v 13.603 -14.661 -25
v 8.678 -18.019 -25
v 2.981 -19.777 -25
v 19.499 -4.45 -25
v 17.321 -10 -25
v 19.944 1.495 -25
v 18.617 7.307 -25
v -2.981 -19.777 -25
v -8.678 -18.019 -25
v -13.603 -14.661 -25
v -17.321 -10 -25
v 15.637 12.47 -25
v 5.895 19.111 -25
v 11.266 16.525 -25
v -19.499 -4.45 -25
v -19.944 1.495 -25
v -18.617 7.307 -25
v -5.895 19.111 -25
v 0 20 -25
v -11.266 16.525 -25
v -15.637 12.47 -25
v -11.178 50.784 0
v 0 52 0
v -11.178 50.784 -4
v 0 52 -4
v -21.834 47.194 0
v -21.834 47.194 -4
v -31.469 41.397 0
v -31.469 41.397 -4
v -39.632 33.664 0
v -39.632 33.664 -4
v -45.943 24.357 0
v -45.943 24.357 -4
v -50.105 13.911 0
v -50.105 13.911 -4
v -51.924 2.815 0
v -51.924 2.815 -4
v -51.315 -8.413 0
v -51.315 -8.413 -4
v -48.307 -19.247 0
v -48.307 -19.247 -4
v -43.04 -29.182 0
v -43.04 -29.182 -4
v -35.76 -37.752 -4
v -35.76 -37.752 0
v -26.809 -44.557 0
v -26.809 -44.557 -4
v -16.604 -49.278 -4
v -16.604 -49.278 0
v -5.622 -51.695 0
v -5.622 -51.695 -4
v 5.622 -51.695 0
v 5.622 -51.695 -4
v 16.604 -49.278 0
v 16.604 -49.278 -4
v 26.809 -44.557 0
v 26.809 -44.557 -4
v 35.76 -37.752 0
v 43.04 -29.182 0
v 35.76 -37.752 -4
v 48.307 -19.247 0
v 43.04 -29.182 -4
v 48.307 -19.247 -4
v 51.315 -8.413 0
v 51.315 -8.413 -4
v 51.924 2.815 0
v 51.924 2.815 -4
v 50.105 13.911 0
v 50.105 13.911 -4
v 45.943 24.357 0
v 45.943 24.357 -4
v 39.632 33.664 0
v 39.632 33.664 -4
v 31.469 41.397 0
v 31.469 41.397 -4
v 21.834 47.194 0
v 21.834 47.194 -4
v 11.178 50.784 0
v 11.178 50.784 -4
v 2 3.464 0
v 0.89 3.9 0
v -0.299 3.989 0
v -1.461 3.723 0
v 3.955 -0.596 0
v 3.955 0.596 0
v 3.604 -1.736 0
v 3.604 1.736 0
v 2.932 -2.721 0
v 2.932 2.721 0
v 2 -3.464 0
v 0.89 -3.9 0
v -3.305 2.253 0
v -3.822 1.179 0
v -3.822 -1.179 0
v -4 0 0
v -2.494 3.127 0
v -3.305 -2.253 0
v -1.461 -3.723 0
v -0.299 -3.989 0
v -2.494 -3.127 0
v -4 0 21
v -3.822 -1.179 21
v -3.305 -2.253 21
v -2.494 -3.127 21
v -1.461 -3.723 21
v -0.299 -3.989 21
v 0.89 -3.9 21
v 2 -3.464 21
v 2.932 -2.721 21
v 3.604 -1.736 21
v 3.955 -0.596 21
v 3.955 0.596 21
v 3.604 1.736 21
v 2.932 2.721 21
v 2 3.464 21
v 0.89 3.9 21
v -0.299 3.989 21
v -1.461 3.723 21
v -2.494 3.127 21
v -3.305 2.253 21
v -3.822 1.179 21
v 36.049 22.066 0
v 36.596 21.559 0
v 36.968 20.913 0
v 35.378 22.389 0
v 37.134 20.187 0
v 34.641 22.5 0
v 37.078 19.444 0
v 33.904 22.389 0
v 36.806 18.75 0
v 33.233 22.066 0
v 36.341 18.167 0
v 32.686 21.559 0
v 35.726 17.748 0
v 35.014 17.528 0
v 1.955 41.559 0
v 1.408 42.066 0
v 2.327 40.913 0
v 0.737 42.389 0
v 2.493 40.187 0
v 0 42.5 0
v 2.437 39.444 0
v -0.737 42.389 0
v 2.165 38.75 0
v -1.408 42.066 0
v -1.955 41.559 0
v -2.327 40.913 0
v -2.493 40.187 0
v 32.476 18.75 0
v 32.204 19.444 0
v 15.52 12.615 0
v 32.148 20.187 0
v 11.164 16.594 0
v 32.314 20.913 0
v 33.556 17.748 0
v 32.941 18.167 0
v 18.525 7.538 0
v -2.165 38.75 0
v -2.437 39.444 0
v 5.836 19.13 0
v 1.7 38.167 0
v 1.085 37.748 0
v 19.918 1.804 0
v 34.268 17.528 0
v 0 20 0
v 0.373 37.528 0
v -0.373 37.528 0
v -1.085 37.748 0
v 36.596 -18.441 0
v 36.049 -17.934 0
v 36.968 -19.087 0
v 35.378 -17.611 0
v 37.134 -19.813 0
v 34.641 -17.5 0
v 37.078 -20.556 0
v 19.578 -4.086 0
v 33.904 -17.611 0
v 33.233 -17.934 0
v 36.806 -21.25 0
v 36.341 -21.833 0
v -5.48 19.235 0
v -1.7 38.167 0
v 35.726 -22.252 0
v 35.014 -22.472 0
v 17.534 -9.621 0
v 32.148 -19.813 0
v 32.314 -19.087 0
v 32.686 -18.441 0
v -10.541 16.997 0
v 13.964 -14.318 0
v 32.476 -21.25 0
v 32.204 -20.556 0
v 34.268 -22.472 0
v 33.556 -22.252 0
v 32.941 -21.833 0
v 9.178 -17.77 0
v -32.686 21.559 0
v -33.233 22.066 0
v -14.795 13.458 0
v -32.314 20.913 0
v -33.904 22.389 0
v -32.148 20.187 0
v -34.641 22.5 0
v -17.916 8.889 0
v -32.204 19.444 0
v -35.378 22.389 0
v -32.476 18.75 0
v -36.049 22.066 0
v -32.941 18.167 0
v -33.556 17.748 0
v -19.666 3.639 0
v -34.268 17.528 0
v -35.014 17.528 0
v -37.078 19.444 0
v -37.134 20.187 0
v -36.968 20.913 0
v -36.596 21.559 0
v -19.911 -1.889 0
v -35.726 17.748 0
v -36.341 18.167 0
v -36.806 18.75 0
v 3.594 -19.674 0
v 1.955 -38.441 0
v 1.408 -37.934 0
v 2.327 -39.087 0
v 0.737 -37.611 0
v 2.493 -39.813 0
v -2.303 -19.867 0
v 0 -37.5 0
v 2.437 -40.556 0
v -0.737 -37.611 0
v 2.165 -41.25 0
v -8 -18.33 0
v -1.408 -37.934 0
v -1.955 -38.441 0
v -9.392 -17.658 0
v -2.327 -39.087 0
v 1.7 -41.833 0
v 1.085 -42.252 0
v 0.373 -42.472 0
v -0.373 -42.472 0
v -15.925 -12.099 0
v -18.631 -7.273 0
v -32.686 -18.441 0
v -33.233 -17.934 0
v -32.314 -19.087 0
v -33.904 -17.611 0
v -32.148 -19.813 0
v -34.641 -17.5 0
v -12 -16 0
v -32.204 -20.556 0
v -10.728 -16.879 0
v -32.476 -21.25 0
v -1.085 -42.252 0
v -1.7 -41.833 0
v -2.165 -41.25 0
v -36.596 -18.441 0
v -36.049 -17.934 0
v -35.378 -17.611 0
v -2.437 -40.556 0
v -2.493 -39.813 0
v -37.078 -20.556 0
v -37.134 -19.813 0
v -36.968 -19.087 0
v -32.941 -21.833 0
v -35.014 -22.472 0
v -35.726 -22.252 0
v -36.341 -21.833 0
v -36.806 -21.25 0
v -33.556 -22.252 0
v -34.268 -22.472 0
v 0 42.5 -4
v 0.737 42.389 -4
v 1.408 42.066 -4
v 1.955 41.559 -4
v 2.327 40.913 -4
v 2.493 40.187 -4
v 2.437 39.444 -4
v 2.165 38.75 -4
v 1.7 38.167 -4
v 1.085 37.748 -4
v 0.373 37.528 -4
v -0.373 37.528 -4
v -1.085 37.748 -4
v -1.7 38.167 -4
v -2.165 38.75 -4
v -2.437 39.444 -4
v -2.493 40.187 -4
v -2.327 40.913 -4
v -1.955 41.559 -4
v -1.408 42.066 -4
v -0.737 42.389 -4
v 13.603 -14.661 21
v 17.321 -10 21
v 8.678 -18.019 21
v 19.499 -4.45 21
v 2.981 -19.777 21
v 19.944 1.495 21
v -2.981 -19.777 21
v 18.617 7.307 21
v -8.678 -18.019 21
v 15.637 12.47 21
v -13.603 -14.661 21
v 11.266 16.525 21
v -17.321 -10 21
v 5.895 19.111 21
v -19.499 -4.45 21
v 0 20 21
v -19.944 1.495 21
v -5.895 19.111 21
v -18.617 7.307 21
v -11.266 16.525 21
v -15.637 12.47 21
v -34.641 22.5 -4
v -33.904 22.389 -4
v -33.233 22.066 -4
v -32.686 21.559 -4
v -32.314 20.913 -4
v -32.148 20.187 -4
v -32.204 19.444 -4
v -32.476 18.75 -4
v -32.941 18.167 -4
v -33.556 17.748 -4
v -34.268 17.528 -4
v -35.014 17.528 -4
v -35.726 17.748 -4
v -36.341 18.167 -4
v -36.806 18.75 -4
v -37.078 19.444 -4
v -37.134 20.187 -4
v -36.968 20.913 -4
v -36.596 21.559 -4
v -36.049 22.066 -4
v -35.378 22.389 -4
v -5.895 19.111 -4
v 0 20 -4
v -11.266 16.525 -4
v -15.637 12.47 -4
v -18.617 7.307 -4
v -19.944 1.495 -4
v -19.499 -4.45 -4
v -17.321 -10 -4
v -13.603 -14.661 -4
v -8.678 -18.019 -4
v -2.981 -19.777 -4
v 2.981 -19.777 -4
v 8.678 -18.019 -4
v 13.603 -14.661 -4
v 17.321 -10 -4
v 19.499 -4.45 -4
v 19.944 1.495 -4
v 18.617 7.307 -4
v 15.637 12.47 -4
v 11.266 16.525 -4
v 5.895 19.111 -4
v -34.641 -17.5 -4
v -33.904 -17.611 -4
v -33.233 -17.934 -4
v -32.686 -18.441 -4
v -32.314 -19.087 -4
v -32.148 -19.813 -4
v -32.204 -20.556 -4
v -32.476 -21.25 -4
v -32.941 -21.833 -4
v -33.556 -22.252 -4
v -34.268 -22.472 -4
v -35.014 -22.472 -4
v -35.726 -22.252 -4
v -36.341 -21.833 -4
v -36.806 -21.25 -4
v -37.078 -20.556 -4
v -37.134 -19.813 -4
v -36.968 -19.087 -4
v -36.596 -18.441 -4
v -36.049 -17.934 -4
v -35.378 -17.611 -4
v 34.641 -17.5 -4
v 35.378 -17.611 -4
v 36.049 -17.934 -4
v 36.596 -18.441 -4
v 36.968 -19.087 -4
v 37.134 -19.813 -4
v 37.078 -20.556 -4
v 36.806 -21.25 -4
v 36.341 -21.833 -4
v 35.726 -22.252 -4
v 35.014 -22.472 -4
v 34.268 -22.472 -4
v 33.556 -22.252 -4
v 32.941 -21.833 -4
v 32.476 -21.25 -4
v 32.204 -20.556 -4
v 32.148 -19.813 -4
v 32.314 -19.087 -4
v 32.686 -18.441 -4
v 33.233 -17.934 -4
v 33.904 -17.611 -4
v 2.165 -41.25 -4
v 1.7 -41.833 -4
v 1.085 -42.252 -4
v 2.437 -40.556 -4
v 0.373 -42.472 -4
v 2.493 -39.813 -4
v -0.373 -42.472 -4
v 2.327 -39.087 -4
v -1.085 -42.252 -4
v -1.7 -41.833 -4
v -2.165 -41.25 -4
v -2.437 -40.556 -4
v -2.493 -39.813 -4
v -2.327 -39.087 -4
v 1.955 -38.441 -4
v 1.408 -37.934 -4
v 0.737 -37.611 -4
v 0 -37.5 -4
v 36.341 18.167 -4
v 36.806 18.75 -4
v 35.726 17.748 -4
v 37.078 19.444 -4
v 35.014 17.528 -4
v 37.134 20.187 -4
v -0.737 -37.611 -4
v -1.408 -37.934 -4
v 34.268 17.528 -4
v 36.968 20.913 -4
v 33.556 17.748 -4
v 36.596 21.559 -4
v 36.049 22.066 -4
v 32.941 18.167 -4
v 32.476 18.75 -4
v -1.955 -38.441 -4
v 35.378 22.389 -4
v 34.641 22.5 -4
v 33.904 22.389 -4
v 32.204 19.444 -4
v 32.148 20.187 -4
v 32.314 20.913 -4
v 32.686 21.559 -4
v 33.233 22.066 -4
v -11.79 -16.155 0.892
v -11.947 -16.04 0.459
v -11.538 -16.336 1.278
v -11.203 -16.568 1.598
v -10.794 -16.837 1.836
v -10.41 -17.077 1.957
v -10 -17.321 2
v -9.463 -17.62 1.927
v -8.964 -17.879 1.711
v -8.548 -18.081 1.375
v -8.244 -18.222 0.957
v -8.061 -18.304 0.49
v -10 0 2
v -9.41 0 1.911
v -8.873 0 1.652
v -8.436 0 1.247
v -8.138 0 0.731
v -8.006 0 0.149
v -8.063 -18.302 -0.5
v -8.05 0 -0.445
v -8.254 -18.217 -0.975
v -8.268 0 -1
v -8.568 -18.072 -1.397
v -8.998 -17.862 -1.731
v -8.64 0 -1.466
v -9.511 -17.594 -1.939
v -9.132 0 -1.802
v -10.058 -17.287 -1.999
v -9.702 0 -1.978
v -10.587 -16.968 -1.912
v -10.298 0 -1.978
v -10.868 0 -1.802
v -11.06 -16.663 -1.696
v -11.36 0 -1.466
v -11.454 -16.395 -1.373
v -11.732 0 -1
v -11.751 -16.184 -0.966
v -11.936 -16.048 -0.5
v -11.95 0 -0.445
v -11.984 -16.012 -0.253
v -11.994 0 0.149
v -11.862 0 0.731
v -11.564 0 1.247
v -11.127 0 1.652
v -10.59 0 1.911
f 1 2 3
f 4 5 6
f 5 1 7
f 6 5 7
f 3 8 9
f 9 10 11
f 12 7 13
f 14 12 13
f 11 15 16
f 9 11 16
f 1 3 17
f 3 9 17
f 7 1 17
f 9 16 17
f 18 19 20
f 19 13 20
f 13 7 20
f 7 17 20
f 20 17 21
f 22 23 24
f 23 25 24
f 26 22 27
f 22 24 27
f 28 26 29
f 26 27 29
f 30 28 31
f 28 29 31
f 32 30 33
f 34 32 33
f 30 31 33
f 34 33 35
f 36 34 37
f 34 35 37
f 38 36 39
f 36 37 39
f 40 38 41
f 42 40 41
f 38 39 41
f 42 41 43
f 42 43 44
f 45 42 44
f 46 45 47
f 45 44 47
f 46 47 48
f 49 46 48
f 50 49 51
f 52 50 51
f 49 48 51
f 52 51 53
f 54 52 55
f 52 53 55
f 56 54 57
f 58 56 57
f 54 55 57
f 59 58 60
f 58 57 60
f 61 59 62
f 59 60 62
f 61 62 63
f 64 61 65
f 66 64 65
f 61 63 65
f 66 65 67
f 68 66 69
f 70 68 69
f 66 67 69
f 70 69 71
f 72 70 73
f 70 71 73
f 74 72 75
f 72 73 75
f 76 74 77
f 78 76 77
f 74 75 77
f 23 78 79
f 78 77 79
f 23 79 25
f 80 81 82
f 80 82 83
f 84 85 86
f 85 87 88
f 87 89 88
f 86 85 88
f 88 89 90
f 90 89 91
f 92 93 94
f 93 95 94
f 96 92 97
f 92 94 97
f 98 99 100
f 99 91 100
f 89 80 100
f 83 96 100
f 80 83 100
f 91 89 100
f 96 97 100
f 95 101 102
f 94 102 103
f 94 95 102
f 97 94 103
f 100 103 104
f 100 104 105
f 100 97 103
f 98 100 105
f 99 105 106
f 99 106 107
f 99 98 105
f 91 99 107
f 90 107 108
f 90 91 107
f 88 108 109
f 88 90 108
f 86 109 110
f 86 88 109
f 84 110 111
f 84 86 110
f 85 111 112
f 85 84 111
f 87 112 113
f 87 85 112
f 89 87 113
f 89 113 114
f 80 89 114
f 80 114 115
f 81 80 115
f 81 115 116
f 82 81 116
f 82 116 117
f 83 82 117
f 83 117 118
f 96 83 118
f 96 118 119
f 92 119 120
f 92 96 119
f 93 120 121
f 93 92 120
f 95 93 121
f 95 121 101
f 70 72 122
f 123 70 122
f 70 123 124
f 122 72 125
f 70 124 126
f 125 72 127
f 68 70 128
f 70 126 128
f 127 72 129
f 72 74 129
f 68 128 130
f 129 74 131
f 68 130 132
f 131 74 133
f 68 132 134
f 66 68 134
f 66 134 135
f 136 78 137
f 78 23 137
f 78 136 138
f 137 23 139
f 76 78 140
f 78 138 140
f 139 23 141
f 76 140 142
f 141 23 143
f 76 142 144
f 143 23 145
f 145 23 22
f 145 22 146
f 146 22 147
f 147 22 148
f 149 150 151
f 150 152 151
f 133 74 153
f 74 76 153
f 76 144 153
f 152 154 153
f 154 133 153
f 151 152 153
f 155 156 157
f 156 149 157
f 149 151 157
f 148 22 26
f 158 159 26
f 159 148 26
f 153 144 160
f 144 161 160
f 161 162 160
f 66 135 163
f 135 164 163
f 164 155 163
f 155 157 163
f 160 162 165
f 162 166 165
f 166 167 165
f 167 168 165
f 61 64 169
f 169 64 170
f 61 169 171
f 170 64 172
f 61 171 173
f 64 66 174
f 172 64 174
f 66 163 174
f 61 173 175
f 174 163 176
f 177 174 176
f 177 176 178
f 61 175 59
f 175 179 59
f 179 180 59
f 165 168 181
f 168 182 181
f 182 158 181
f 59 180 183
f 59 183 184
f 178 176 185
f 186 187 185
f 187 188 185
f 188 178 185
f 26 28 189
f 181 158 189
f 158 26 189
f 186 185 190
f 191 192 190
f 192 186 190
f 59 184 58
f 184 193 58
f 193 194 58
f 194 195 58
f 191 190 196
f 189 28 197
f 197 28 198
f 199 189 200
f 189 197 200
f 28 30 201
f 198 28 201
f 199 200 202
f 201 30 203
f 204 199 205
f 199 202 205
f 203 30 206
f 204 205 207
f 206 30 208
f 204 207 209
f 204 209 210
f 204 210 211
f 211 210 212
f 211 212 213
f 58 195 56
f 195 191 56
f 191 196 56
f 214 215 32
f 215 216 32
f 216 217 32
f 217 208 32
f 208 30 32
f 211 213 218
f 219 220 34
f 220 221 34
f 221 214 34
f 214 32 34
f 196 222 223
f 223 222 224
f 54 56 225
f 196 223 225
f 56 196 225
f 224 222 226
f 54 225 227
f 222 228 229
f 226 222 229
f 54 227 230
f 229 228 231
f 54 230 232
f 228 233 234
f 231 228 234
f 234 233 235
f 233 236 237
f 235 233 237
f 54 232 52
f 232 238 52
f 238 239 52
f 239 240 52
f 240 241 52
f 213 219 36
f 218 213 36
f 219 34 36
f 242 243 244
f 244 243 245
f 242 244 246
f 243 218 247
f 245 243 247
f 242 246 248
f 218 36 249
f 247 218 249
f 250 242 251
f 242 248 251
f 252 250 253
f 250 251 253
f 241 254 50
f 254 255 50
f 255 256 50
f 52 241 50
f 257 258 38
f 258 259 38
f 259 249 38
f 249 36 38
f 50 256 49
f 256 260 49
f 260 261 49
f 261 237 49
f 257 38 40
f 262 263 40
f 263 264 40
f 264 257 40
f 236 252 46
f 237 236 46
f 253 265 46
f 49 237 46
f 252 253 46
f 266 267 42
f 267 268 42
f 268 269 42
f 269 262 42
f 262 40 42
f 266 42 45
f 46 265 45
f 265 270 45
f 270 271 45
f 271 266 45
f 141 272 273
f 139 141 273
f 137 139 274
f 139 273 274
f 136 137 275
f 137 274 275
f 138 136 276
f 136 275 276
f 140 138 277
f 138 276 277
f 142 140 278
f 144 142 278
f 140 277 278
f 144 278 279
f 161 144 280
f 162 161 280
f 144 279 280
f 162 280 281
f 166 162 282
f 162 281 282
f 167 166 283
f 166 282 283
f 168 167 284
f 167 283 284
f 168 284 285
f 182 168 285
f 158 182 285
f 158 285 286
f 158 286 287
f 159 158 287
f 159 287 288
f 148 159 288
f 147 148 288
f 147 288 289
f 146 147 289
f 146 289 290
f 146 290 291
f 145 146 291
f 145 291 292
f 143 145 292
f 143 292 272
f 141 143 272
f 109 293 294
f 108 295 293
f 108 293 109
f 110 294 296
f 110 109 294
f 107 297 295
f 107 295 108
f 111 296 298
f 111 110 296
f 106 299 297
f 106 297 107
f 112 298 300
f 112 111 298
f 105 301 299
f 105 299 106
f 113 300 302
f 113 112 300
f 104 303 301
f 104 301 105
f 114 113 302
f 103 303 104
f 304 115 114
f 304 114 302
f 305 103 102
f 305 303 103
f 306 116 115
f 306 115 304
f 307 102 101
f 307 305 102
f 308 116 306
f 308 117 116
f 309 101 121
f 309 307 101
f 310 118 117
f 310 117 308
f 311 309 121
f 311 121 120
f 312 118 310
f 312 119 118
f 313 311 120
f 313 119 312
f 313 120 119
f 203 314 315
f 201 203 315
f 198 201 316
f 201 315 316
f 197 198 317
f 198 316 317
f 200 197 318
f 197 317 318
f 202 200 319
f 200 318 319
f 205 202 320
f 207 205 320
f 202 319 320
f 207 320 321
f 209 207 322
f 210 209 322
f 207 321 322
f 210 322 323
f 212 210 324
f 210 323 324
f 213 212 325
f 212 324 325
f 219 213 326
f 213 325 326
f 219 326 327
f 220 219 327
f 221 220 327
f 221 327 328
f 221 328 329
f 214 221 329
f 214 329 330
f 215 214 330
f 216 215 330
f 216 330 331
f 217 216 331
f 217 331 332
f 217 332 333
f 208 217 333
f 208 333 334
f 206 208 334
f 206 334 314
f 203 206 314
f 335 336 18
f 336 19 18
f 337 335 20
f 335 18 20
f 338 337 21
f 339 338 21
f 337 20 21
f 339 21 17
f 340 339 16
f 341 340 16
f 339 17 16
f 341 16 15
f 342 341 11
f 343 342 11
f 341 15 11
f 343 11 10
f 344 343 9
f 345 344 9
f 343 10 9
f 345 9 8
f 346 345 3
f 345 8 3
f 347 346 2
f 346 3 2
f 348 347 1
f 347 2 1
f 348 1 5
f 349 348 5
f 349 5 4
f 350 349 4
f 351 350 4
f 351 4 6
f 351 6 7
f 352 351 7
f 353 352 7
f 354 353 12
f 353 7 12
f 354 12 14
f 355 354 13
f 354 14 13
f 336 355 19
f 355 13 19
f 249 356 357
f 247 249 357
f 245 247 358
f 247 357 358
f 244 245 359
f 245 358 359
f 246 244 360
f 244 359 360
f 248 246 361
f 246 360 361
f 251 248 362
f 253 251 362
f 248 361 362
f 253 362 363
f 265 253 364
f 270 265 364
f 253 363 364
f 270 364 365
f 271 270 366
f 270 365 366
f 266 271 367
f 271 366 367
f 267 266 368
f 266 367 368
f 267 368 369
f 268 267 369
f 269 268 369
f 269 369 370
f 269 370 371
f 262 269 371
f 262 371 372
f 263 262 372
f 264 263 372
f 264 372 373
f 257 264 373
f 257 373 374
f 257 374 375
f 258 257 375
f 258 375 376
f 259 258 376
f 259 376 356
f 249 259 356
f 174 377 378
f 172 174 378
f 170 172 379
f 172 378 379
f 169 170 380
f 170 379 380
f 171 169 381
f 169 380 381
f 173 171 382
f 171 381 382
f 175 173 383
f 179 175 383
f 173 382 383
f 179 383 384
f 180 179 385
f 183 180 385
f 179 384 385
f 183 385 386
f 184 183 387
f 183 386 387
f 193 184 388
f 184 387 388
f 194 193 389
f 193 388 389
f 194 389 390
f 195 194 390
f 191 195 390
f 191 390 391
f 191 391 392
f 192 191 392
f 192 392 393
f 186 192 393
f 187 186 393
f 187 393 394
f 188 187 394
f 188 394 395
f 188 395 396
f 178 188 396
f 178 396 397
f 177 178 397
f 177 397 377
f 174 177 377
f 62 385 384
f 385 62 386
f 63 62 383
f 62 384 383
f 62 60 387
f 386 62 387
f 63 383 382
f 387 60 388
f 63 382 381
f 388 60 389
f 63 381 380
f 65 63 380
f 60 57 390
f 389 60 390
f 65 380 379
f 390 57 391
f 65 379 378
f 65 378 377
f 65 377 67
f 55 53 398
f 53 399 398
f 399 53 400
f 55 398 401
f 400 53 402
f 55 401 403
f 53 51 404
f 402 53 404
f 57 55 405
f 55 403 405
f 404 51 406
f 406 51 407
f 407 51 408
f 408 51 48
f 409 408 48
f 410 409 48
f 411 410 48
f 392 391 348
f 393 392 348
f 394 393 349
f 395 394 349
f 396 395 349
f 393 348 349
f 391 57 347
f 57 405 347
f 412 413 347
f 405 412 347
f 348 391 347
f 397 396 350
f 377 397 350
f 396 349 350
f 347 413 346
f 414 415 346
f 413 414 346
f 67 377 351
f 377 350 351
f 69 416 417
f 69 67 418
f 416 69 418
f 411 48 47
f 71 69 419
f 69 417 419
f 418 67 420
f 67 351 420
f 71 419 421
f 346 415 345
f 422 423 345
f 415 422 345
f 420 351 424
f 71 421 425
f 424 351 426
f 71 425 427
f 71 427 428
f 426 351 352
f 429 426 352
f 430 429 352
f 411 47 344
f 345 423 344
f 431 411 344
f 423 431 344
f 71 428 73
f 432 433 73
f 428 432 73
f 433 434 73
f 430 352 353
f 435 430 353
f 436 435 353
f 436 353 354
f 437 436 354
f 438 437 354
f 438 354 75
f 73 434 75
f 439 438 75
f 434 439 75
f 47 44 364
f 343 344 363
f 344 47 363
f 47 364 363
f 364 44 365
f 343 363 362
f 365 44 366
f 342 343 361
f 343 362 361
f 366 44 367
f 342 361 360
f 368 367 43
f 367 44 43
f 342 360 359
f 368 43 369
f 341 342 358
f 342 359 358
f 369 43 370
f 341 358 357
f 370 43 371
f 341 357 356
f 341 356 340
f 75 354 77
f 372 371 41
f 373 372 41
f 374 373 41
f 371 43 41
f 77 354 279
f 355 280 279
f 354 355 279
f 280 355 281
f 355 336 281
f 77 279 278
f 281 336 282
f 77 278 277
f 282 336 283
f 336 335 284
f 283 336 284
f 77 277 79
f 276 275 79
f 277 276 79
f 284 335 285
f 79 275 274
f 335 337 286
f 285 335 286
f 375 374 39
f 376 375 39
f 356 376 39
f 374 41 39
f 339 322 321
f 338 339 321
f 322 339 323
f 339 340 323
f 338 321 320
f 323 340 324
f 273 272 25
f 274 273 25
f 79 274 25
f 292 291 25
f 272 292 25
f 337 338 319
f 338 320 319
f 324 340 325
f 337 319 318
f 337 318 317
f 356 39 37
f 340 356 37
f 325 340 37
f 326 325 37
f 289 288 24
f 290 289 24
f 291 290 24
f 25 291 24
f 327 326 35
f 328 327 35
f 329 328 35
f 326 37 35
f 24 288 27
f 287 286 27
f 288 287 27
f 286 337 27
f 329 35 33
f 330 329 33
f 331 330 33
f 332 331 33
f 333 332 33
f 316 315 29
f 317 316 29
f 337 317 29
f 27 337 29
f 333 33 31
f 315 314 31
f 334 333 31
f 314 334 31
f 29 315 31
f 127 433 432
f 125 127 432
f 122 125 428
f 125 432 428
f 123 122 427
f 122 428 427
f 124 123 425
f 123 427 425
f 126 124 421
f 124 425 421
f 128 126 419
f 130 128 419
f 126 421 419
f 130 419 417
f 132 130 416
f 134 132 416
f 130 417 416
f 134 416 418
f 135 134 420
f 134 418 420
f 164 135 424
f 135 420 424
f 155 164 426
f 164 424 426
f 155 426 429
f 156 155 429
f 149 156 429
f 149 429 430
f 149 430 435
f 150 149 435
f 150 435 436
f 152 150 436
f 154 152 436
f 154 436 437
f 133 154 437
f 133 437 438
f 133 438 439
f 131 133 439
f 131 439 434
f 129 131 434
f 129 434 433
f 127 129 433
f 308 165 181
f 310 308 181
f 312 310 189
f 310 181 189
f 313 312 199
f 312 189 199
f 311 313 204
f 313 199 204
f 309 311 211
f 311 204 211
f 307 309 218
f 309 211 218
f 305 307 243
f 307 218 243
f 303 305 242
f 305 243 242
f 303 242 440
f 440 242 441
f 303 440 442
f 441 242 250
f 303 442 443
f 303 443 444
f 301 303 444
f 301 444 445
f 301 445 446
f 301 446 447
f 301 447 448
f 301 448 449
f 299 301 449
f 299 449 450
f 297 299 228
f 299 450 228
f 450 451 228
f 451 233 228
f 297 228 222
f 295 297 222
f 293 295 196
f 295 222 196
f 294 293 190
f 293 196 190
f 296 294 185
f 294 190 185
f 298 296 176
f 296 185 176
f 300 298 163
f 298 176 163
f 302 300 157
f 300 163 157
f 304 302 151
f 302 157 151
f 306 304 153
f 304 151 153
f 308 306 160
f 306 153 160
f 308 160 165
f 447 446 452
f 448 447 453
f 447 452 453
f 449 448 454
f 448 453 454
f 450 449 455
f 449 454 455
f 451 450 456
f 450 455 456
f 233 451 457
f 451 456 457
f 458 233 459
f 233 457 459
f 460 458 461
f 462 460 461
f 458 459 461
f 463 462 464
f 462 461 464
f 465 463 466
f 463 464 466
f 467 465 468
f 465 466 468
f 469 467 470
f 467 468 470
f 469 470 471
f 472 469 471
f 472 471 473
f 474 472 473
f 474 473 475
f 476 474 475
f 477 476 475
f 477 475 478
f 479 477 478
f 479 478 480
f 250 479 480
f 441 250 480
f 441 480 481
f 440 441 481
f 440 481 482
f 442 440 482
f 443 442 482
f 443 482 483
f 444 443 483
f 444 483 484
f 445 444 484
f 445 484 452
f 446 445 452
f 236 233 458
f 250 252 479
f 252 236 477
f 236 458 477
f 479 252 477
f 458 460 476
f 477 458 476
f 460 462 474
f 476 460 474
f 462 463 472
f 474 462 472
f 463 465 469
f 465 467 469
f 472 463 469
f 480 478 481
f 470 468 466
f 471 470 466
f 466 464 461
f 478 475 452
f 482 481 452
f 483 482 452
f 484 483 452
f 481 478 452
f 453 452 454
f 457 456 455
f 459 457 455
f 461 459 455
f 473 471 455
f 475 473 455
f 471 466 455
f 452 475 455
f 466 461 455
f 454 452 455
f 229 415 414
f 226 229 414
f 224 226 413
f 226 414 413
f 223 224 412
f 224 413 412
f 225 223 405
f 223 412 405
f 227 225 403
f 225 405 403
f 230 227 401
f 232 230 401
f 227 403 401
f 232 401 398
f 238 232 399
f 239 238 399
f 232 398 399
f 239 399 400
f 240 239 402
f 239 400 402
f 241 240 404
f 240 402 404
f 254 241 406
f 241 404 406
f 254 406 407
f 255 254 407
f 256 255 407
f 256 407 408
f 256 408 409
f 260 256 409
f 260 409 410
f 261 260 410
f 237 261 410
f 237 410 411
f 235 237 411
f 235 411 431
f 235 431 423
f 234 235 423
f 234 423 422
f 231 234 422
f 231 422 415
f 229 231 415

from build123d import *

# Parameters (mm, degrees)
SKETCH2_R               = 20
SKETCH2_R_2             = 4
BOSS_EXTRUDE1_DEPTH     = 21
CUT_EXTRUDE2_REACH      = 79.672
SKETCH3_R               = 2.5
CUT_EXTRUDE3_REACH      = 79.672
CUT_EXTRUDE3_END_RADIUS = 20
SKETCH4_R               = 2


with BuildPart() as part:
    # Sketch1 → Revolve1 (revolve)
    with BuildSketch(Plane(origin=(0, 0, 0), x_dir=(0, 0, -1), z_dir=(1, 0, 0))):
        Polygon((0, 0), (0, 52), (4, 52), (4, 20), (25, 20), (25, 0), align=None)
    revolve(axis=Axis((0, 0, -25), (0, 0, 1)))

    # Sketch2 → Boss-Extrude1 (add)
    with BuildSketch(Plane.XY):
        with Locations(Location((0, 0, 0), (0, 0, 90))):
            Circle(SKETCH2_R)
        with Locations(Location((0, 0, 0), (0, 0, 180))):
            Circle(SKETCH2_R_2, mode=Mode.SUBTRACT)
    extrude(amount=BOSS_EXTRUDE1_DEPTH)

    # Sketch3 → Cut-Extrude2 (cut, up to next)
    with BuildSketch(Plane(origin=(0, 0, -4), x_dir=(-1, 0, 0), z_dir=(0, 0, -1)), mode=Mode.PRIVATE) as cut_extrude2_sk1:
        with Locations(Location((0, 40, 0), (0, 0, 90))):
            Circle(SKETCH3_R)
    cut_extrude2_tool1 = extrude(cut_extrude2_sk1.sketch, amount=-CUT_EXTRUDE2_REACH, mode=Mode.PRIVATE) & part.part
    # Sketch3 → Cut-Extrude2 (cut, up to next)
    with BuildSketch(Plane(origin=(0, 0, -4), x_dir=(-1, 0, 0), z_dir=(0, 0, -1)), mode=Mode.PRIVATE) as cut_extrude2_sk2:
        with Locations(Location((34.641016151, 20, 0), (0, 0, 90))):
            Circle(SKETCH3_R)
    cut_extrude2_tool2 = extrude(cut_extrude2_sk2.sketch, amount=-CUT_EXTRUDE2_REACH, mode=Mode.PRIVATE) & part.part
    # Sketch3 → Cut-Extrude2 (cut, up to next)
    with BuildSketch(Plane(origin=(0, 0, -4), x_dir=(-1, 0, 0), z_dir=(0, 0, -1)), mode=Mode.PRIVATE) as cut_extrude2_sk3:
        with Locations(Location((34.641016151, -20, 0), (0, 0, 90))):
            Circle(SKETCH3_R)
    cut_extrude2_tool3 = extrude(cut_extrude2_sk3.sketch, amount=-CUT_EXTRUDE2_REACH, mode=Mode.PRIVATE) & part.part
    # Sketch3 → Cut-Extrude2 (cut, up to next)
    with BuildSketch(Plane(origin=(0, 0, -4), x_dir=(-1, 0, 0), z_dir=(0, 0, -1)), mode=Mode.PRIVATE) as cut_extrude2_sk4:
        with Locations(Location((0, -40, 0), (0, 0, 90))):
            Circle(SKETCH3_R)
    cut_extrude2_tool4 = extrude(cut_extrude2_sk4.sketch, amount=-CUT_EXTRUDE2_REACH, mode=Mode.PRIVATE) & part.part
    # Sketch3 → Cut-Extrude2 (cut, up to next)
    with BuildSketch(Plane(origin=(0, 0, -4), x_dir=(-1, 0, 0), z_dir=(0, 0, -1)), mode=Mode.PRIVATE) as cut_extrude2_sk5:
        with Locations(Location((-34.641016151, -20, 0), (0, 0, 90))):
            Circle(SKETCH3_R)
    cut_extrude2_tool5 = extrude(cut_extrude2_sk5.sketch, amount=-CUT_EXTRUDE2_REACH, mode=Mode.PRIVATE) & part.part
    # Sketch3 → Cut-Extrude2 (cut, up to next)
    with BuildSketch(Plane(origin=(0, 0, -4), x_dir=(-1, 0, 0), z_dir=(0, 0, -1)), mode=Mode.PRIVATE) as cut_extrude2_sk6:
        with Locations(Location((-34.641016151, 20, 0), (0, 0, 90))):
            Circle(SKETCH3_R)
    cut_extrude2_tool6 = extrude(cut_extrude2_sk6.sketch, amount=-CUT_EXTRUDE2_REACH, mode=Mode.PRIVATE) & part.part
    add(cut_extrude2_tool1.solids().sort_by_distance((0, 40, -4))[0], mode=Mode.SUBTRACT)
    add(cut_extrude2_tool2.solids().sort_by_distance((-34.641016, 20, -4))[0], mode=Mode.SUBTRACT)
    add(cut_extrude2_tool3.solids().sort_by_distance((-34.641016, -20, -4))[0], mode=Mode.SUBTRACT)
    add(cut_extrude2_tool4.solids().sort_by_distance((0, -40, -4))[0], mode=Mode.SUBTRACT)
    add(cut_extrude2_tool5.solids().sort_by_distance((34.641016, -20, -4))[0], mode=Mode.SUBTRACT)
    add(cut_extrude2_tool6.solids().sort_by_distance((34.641016, 20, -4))[0], mode=Mode.SUBTRACT)

    # Cut-Extrude3: up to this cylinder (the profile starts inside it)
    cut_extrude3_end = Plane(origin=(0, 0, 0), z_dir=(0, 0, -1)) * Cylinder(CUT_EXTRUDE3_END_RADIUS, 200.344, mode=Mode.PRIVATE)
    # Sketch4 → Cut-Extrude3 (cut, up to the surface)
    with BuildSketch(Plane(origin=(0, 0, 0), x_dir=(1, 0, 0), z_dir=(0, 1, 0)), mode=Mode.PRIVATE) as cut_extrude3_sk1:
        with Locations(Location((-10, 0, 0), (0, 0, 270))):
            Circle(SKETCH4_R)
    cut_extrude3_tool1 = extrude(cut_extrude3_sk1.sketch, amount=-CUT_EXTRUDE3_REACH, mode=Mode.PRIVATE) & cut_extrude3_end
    add(cut_extrude3_tool1.solids().sort_by_distance((-10, 0, 0))[0], mode=Mode.SUBTRACT)


solid = part.part
